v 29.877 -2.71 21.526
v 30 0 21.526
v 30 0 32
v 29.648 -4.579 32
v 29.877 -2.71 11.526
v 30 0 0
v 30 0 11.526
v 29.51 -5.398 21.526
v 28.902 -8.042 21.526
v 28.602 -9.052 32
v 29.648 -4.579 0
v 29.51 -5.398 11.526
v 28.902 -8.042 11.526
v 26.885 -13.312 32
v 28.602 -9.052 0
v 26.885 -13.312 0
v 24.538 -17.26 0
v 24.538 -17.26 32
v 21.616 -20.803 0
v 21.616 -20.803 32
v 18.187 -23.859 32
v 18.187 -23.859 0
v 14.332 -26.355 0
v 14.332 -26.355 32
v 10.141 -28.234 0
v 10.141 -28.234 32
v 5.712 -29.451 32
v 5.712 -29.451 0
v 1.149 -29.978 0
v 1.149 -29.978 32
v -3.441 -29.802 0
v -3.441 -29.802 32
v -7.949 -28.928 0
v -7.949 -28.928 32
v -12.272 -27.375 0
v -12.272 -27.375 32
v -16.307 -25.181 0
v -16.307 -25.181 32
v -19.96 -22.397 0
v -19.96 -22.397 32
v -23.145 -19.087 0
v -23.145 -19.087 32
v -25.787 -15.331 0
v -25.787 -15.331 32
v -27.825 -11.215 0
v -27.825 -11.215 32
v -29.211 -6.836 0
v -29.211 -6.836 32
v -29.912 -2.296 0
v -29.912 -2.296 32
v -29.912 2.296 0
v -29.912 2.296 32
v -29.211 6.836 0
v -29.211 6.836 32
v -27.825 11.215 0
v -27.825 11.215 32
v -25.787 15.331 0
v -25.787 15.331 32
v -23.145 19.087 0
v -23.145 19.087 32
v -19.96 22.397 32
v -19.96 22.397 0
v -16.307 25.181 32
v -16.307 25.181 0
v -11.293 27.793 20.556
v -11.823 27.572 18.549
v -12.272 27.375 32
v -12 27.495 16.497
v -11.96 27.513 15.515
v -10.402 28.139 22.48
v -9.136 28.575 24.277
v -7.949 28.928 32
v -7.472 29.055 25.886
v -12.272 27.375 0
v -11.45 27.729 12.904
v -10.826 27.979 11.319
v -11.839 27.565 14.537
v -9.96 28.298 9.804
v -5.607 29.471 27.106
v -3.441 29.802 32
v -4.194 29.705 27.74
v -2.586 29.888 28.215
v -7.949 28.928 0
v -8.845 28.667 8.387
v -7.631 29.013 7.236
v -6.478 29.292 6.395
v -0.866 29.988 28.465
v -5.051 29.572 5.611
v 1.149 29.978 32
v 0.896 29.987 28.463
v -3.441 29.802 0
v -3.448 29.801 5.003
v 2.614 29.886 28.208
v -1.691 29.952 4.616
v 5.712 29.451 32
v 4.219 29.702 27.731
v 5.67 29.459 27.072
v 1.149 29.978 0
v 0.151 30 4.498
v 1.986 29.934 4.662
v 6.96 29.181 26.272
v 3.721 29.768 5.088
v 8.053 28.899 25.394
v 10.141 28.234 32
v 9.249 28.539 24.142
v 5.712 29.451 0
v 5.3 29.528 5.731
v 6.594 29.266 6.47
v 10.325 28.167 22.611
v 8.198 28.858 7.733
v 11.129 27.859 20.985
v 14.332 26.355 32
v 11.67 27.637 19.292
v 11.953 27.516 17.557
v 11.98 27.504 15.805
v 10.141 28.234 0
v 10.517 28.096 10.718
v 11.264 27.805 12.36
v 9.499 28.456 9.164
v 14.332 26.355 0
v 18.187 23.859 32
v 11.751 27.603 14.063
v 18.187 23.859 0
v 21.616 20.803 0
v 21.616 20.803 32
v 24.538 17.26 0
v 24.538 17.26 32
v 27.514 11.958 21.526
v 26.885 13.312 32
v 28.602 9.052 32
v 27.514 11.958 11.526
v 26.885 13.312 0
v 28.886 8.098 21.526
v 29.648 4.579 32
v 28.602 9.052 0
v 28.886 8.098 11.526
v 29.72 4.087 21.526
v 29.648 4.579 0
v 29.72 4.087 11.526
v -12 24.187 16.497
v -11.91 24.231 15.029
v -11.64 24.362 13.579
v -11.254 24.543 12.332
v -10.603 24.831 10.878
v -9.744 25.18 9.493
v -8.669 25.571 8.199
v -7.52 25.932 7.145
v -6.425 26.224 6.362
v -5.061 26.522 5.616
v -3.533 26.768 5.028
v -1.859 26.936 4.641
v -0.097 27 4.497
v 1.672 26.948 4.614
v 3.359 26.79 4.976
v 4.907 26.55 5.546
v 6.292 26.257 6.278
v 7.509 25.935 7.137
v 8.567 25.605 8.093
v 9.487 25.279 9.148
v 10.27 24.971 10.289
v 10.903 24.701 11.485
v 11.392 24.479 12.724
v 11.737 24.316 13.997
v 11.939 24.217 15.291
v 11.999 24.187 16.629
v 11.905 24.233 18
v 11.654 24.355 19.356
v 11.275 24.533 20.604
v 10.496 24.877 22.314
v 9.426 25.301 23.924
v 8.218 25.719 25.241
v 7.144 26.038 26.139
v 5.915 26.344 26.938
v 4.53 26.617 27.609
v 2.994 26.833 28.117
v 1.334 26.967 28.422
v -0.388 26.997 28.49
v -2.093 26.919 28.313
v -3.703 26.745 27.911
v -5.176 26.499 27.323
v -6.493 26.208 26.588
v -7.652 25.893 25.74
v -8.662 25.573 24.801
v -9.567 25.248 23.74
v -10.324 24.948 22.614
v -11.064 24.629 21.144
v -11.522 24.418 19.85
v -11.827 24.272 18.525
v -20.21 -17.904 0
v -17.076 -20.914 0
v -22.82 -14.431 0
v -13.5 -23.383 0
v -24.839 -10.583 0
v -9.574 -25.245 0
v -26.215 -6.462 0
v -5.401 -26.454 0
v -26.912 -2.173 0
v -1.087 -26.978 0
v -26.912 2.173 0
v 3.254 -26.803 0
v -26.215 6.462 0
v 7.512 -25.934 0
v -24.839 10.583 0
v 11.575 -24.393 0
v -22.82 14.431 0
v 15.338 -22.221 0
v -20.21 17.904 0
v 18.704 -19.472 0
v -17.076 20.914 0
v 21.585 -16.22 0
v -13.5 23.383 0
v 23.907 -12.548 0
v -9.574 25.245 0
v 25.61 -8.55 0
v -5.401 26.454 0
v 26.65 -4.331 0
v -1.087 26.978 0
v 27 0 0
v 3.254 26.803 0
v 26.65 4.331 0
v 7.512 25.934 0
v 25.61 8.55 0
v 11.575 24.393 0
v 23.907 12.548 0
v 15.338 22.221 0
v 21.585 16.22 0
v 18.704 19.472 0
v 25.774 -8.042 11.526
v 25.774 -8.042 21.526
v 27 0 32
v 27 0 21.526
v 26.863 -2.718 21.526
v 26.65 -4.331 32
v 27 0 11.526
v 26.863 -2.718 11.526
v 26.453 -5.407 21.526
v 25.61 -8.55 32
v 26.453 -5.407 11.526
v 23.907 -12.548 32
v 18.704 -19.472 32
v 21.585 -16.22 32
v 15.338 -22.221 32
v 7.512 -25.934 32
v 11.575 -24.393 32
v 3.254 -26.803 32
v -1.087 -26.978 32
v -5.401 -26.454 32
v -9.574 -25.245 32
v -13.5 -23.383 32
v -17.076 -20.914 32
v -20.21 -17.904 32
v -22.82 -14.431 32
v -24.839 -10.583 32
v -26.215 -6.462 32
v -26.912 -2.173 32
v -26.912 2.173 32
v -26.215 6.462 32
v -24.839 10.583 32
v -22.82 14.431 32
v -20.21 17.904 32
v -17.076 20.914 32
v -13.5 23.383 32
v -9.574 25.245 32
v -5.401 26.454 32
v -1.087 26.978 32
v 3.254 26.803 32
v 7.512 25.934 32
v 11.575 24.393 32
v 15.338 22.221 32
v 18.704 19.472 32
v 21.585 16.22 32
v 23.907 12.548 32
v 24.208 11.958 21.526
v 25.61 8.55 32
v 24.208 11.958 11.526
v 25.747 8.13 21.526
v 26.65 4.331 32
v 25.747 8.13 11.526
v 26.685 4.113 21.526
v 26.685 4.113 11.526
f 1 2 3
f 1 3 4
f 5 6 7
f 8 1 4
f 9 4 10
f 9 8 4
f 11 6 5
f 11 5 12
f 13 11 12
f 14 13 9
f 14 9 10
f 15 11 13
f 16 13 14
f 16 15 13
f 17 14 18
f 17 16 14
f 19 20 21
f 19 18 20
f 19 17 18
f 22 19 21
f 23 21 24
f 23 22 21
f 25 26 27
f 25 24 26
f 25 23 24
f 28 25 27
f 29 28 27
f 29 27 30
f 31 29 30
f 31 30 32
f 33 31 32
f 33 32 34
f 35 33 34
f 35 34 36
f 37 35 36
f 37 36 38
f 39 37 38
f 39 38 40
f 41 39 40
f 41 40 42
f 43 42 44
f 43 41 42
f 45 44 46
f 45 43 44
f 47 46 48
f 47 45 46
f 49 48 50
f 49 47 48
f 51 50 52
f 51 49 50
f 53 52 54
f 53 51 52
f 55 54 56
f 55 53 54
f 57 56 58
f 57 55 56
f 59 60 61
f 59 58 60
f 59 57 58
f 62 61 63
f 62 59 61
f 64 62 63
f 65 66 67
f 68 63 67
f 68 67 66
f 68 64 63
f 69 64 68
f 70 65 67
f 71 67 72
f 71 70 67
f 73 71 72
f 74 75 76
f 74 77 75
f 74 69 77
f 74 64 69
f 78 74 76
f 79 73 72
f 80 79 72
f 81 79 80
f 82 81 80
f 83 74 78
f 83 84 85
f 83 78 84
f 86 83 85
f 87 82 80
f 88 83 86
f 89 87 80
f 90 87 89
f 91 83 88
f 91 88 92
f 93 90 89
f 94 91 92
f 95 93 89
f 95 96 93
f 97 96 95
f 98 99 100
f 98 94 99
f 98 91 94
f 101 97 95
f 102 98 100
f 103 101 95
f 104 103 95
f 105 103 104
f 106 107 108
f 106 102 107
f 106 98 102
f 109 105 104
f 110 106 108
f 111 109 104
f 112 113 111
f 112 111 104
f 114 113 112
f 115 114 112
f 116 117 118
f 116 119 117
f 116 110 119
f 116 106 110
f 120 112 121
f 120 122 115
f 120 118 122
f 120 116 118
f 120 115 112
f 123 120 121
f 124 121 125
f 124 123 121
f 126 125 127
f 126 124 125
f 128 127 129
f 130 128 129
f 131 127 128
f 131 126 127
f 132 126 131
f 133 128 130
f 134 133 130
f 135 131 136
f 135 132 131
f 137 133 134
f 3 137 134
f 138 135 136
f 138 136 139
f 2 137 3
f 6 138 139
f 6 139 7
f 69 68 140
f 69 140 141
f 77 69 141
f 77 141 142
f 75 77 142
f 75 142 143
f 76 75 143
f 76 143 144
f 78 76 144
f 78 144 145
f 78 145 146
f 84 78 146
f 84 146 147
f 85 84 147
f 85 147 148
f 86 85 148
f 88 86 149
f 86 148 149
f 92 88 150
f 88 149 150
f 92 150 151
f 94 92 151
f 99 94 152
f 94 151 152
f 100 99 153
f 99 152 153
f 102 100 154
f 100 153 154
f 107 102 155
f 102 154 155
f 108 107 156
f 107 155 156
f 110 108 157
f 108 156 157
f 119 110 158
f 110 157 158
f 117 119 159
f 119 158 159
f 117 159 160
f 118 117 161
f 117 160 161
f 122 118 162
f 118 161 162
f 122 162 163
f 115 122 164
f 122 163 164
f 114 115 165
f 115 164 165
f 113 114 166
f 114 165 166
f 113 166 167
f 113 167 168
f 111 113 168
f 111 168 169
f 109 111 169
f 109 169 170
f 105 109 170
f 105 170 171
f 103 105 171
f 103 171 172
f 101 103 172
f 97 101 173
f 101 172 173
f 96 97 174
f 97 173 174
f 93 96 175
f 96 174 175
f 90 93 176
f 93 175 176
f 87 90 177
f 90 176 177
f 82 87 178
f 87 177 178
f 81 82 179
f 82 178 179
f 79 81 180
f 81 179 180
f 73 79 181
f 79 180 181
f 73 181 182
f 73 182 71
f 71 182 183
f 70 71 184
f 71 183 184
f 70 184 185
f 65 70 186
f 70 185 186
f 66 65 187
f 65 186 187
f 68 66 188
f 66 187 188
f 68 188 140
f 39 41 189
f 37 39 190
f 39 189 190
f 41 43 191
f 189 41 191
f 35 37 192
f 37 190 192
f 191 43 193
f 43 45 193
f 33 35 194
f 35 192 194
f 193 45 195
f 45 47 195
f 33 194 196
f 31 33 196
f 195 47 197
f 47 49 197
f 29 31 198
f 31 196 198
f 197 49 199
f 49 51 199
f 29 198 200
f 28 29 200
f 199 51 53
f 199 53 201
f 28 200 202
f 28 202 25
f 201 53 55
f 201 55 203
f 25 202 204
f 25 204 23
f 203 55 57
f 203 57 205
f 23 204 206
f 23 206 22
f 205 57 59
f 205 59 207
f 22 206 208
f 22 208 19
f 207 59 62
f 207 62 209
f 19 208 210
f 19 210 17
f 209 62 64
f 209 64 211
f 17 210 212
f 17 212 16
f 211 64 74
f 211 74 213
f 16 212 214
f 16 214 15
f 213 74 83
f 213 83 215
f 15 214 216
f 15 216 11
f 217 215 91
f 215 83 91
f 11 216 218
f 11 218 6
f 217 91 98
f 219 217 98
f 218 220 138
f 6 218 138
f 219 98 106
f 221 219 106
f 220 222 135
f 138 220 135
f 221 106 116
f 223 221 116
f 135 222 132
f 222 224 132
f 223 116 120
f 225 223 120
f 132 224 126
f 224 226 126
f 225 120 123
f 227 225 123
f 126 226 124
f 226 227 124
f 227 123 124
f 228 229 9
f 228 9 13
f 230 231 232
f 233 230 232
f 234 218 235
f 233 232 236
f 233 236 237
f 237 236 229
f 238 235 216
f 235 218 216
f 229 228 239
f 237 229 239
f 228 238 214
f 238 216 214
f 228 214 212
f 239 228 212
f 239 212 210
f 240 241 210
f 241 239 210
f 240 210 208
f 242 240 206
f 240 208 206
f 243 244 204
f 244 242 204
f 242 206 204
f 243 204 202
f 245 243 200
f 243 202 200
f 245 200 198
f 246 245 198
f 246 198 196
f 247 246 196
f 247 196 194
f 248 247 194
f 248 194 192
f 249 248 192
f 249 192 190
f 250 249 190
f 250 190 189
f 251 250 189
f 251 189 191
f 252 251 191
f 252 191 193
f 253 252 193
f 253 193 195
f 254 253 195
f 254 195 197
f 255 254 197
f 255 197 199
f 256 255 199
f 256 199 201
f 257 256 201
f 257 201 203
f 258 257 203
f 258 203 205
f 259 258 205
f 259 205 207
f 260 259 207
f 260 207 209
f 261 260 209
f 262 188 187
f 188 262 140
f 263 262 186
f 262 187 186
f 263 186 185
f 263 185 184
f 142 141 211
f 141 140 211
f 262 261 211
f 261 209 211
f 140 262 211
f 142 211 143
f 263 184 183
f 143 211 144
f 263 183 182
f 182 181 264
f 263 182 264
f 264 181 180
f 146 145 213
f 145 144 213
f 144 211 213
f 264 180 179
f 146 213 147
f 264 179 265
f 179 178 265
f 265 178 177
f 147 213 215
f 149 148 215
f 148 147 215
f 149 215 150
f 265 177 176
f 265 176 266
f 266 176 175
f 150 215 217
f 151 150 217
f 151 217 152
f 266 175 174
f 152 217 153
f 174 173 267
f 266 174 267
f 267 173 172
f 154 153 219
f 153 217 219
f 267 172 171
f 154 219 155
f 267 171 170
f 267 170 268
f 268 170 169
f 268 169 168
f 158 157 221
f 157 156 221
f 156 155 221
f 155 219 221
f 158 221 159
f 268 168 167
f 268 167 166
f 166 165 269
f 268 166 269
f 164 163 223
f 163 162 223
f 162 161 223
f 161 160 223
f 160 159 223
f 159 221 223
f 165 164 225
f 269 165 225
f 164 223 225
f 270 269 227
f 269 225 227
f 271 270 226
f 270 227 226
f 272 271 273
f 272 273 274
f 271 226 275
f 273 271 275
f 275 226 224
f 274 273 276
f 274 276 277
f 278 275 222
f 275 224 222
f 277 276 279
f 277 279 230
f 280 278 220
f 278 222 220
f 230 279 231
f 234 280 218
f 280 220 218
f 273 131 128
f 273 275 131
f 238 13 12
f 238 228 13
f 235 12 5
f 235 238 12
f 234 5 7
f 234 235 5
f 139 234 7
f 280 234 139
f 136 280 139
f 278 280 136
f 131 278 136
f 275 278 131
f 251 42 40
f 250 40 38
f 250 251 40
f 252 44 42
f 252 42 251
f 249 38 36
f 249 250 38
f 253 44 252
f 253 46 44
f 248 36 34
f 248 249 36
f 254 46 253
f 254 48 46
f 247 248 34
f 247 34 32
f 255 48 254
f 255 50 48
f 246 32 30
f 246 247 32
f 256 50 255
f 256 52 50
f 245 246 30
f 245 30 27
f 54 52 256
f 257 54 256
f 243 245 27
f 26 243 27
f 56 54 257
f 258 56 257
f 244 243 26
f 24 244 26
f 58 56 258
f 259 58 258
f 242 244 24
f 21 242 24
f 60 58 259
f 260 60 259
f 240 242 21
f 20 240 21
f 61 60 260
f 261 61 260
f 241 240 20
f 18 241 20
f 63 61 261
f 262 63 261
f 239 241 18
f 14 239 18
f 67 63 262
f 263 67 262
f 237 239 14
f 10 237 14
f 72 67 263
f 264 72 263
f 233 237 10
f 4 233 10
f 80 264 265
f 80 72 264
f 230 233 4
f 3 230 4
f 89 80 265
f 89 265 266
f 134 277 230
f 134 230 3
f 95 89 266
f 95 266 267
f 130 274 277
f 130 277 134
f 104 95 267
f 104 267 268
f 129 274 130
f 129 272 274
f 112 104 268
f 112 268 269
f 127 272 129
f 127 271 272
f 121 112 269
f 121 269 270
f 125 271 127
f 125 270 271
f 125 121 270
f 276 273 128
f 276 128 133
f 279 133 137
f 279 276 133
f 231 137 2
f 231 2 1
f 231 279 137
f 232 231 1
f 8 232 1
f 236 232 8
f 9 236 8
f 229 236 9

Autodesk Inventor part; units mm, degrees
ref_plane "YZ Plane" through (0, 0, 0) normal (1, 0, 0) x (0, 1, 0)
ref_plane "XZ Plane" through (0, 0, 0) normal (0, 1, 0) x (-1, 0, 0)
ref_plane "XY Plane" through (0, 0, 0) normal (0, 0, 1) x (1, 0, 0)
sketch "Esquisse1" plane through (0, 0, 0) normal (0, 0, 1) x (1, 0, 0)
  circle A0 centre (0, 0) radius 30
  circle A1 centre (0, 0) radius 27
  dimension "d0" = 60
  dimension "d1" = 54
extrude "Extrusion1" add sketch "Esquisse1" along normal blind 32
sketch "Esquisse2" plane through (0, 0, 0) normal (0, 1, 0) x (-1, 0, 0)
  circle A0 centre (0, 16.4966) radius 15.5
  circle A1 centre (0, 16.4966) radius 12
  point P0 (0, 0)
  dimension "d18" = 24
  dimension "d19" = 31
extrude "Extrusion2" cut sketch "Esquisse2" along normal blind 111.75 contours A1
thread "Filetage1" size "M25x2" class "6H" standard "ANSI Metric M Profile" full length
sketch "Esquisse3" plane through (0, 0, 0) normal (1, 0, 0) x (0, 1, 0)
  line L0 (11.9576, 21.526) -> (-8.0424, 21.526)
  line L1 (-8.0424, 21.526) -> (-8.0424, 11.526)
  line L2 (-8.0424, 11.526) -> (11.9576, 11.526)
  line L3 (11.9576, 11.526) -> (11.9576, 21.526)
  line L4 (0, 0) -> (0, 32)
  line L5 (30, 0) -> (-30, 0) projected
  dimension "d10" = 10
  dimension "d12" = 32
  dimension "d17" = 20
extrude "Extrusion3" cut sketch "Esquisse3" along normal blind 30
properties part number "Cadran base"
